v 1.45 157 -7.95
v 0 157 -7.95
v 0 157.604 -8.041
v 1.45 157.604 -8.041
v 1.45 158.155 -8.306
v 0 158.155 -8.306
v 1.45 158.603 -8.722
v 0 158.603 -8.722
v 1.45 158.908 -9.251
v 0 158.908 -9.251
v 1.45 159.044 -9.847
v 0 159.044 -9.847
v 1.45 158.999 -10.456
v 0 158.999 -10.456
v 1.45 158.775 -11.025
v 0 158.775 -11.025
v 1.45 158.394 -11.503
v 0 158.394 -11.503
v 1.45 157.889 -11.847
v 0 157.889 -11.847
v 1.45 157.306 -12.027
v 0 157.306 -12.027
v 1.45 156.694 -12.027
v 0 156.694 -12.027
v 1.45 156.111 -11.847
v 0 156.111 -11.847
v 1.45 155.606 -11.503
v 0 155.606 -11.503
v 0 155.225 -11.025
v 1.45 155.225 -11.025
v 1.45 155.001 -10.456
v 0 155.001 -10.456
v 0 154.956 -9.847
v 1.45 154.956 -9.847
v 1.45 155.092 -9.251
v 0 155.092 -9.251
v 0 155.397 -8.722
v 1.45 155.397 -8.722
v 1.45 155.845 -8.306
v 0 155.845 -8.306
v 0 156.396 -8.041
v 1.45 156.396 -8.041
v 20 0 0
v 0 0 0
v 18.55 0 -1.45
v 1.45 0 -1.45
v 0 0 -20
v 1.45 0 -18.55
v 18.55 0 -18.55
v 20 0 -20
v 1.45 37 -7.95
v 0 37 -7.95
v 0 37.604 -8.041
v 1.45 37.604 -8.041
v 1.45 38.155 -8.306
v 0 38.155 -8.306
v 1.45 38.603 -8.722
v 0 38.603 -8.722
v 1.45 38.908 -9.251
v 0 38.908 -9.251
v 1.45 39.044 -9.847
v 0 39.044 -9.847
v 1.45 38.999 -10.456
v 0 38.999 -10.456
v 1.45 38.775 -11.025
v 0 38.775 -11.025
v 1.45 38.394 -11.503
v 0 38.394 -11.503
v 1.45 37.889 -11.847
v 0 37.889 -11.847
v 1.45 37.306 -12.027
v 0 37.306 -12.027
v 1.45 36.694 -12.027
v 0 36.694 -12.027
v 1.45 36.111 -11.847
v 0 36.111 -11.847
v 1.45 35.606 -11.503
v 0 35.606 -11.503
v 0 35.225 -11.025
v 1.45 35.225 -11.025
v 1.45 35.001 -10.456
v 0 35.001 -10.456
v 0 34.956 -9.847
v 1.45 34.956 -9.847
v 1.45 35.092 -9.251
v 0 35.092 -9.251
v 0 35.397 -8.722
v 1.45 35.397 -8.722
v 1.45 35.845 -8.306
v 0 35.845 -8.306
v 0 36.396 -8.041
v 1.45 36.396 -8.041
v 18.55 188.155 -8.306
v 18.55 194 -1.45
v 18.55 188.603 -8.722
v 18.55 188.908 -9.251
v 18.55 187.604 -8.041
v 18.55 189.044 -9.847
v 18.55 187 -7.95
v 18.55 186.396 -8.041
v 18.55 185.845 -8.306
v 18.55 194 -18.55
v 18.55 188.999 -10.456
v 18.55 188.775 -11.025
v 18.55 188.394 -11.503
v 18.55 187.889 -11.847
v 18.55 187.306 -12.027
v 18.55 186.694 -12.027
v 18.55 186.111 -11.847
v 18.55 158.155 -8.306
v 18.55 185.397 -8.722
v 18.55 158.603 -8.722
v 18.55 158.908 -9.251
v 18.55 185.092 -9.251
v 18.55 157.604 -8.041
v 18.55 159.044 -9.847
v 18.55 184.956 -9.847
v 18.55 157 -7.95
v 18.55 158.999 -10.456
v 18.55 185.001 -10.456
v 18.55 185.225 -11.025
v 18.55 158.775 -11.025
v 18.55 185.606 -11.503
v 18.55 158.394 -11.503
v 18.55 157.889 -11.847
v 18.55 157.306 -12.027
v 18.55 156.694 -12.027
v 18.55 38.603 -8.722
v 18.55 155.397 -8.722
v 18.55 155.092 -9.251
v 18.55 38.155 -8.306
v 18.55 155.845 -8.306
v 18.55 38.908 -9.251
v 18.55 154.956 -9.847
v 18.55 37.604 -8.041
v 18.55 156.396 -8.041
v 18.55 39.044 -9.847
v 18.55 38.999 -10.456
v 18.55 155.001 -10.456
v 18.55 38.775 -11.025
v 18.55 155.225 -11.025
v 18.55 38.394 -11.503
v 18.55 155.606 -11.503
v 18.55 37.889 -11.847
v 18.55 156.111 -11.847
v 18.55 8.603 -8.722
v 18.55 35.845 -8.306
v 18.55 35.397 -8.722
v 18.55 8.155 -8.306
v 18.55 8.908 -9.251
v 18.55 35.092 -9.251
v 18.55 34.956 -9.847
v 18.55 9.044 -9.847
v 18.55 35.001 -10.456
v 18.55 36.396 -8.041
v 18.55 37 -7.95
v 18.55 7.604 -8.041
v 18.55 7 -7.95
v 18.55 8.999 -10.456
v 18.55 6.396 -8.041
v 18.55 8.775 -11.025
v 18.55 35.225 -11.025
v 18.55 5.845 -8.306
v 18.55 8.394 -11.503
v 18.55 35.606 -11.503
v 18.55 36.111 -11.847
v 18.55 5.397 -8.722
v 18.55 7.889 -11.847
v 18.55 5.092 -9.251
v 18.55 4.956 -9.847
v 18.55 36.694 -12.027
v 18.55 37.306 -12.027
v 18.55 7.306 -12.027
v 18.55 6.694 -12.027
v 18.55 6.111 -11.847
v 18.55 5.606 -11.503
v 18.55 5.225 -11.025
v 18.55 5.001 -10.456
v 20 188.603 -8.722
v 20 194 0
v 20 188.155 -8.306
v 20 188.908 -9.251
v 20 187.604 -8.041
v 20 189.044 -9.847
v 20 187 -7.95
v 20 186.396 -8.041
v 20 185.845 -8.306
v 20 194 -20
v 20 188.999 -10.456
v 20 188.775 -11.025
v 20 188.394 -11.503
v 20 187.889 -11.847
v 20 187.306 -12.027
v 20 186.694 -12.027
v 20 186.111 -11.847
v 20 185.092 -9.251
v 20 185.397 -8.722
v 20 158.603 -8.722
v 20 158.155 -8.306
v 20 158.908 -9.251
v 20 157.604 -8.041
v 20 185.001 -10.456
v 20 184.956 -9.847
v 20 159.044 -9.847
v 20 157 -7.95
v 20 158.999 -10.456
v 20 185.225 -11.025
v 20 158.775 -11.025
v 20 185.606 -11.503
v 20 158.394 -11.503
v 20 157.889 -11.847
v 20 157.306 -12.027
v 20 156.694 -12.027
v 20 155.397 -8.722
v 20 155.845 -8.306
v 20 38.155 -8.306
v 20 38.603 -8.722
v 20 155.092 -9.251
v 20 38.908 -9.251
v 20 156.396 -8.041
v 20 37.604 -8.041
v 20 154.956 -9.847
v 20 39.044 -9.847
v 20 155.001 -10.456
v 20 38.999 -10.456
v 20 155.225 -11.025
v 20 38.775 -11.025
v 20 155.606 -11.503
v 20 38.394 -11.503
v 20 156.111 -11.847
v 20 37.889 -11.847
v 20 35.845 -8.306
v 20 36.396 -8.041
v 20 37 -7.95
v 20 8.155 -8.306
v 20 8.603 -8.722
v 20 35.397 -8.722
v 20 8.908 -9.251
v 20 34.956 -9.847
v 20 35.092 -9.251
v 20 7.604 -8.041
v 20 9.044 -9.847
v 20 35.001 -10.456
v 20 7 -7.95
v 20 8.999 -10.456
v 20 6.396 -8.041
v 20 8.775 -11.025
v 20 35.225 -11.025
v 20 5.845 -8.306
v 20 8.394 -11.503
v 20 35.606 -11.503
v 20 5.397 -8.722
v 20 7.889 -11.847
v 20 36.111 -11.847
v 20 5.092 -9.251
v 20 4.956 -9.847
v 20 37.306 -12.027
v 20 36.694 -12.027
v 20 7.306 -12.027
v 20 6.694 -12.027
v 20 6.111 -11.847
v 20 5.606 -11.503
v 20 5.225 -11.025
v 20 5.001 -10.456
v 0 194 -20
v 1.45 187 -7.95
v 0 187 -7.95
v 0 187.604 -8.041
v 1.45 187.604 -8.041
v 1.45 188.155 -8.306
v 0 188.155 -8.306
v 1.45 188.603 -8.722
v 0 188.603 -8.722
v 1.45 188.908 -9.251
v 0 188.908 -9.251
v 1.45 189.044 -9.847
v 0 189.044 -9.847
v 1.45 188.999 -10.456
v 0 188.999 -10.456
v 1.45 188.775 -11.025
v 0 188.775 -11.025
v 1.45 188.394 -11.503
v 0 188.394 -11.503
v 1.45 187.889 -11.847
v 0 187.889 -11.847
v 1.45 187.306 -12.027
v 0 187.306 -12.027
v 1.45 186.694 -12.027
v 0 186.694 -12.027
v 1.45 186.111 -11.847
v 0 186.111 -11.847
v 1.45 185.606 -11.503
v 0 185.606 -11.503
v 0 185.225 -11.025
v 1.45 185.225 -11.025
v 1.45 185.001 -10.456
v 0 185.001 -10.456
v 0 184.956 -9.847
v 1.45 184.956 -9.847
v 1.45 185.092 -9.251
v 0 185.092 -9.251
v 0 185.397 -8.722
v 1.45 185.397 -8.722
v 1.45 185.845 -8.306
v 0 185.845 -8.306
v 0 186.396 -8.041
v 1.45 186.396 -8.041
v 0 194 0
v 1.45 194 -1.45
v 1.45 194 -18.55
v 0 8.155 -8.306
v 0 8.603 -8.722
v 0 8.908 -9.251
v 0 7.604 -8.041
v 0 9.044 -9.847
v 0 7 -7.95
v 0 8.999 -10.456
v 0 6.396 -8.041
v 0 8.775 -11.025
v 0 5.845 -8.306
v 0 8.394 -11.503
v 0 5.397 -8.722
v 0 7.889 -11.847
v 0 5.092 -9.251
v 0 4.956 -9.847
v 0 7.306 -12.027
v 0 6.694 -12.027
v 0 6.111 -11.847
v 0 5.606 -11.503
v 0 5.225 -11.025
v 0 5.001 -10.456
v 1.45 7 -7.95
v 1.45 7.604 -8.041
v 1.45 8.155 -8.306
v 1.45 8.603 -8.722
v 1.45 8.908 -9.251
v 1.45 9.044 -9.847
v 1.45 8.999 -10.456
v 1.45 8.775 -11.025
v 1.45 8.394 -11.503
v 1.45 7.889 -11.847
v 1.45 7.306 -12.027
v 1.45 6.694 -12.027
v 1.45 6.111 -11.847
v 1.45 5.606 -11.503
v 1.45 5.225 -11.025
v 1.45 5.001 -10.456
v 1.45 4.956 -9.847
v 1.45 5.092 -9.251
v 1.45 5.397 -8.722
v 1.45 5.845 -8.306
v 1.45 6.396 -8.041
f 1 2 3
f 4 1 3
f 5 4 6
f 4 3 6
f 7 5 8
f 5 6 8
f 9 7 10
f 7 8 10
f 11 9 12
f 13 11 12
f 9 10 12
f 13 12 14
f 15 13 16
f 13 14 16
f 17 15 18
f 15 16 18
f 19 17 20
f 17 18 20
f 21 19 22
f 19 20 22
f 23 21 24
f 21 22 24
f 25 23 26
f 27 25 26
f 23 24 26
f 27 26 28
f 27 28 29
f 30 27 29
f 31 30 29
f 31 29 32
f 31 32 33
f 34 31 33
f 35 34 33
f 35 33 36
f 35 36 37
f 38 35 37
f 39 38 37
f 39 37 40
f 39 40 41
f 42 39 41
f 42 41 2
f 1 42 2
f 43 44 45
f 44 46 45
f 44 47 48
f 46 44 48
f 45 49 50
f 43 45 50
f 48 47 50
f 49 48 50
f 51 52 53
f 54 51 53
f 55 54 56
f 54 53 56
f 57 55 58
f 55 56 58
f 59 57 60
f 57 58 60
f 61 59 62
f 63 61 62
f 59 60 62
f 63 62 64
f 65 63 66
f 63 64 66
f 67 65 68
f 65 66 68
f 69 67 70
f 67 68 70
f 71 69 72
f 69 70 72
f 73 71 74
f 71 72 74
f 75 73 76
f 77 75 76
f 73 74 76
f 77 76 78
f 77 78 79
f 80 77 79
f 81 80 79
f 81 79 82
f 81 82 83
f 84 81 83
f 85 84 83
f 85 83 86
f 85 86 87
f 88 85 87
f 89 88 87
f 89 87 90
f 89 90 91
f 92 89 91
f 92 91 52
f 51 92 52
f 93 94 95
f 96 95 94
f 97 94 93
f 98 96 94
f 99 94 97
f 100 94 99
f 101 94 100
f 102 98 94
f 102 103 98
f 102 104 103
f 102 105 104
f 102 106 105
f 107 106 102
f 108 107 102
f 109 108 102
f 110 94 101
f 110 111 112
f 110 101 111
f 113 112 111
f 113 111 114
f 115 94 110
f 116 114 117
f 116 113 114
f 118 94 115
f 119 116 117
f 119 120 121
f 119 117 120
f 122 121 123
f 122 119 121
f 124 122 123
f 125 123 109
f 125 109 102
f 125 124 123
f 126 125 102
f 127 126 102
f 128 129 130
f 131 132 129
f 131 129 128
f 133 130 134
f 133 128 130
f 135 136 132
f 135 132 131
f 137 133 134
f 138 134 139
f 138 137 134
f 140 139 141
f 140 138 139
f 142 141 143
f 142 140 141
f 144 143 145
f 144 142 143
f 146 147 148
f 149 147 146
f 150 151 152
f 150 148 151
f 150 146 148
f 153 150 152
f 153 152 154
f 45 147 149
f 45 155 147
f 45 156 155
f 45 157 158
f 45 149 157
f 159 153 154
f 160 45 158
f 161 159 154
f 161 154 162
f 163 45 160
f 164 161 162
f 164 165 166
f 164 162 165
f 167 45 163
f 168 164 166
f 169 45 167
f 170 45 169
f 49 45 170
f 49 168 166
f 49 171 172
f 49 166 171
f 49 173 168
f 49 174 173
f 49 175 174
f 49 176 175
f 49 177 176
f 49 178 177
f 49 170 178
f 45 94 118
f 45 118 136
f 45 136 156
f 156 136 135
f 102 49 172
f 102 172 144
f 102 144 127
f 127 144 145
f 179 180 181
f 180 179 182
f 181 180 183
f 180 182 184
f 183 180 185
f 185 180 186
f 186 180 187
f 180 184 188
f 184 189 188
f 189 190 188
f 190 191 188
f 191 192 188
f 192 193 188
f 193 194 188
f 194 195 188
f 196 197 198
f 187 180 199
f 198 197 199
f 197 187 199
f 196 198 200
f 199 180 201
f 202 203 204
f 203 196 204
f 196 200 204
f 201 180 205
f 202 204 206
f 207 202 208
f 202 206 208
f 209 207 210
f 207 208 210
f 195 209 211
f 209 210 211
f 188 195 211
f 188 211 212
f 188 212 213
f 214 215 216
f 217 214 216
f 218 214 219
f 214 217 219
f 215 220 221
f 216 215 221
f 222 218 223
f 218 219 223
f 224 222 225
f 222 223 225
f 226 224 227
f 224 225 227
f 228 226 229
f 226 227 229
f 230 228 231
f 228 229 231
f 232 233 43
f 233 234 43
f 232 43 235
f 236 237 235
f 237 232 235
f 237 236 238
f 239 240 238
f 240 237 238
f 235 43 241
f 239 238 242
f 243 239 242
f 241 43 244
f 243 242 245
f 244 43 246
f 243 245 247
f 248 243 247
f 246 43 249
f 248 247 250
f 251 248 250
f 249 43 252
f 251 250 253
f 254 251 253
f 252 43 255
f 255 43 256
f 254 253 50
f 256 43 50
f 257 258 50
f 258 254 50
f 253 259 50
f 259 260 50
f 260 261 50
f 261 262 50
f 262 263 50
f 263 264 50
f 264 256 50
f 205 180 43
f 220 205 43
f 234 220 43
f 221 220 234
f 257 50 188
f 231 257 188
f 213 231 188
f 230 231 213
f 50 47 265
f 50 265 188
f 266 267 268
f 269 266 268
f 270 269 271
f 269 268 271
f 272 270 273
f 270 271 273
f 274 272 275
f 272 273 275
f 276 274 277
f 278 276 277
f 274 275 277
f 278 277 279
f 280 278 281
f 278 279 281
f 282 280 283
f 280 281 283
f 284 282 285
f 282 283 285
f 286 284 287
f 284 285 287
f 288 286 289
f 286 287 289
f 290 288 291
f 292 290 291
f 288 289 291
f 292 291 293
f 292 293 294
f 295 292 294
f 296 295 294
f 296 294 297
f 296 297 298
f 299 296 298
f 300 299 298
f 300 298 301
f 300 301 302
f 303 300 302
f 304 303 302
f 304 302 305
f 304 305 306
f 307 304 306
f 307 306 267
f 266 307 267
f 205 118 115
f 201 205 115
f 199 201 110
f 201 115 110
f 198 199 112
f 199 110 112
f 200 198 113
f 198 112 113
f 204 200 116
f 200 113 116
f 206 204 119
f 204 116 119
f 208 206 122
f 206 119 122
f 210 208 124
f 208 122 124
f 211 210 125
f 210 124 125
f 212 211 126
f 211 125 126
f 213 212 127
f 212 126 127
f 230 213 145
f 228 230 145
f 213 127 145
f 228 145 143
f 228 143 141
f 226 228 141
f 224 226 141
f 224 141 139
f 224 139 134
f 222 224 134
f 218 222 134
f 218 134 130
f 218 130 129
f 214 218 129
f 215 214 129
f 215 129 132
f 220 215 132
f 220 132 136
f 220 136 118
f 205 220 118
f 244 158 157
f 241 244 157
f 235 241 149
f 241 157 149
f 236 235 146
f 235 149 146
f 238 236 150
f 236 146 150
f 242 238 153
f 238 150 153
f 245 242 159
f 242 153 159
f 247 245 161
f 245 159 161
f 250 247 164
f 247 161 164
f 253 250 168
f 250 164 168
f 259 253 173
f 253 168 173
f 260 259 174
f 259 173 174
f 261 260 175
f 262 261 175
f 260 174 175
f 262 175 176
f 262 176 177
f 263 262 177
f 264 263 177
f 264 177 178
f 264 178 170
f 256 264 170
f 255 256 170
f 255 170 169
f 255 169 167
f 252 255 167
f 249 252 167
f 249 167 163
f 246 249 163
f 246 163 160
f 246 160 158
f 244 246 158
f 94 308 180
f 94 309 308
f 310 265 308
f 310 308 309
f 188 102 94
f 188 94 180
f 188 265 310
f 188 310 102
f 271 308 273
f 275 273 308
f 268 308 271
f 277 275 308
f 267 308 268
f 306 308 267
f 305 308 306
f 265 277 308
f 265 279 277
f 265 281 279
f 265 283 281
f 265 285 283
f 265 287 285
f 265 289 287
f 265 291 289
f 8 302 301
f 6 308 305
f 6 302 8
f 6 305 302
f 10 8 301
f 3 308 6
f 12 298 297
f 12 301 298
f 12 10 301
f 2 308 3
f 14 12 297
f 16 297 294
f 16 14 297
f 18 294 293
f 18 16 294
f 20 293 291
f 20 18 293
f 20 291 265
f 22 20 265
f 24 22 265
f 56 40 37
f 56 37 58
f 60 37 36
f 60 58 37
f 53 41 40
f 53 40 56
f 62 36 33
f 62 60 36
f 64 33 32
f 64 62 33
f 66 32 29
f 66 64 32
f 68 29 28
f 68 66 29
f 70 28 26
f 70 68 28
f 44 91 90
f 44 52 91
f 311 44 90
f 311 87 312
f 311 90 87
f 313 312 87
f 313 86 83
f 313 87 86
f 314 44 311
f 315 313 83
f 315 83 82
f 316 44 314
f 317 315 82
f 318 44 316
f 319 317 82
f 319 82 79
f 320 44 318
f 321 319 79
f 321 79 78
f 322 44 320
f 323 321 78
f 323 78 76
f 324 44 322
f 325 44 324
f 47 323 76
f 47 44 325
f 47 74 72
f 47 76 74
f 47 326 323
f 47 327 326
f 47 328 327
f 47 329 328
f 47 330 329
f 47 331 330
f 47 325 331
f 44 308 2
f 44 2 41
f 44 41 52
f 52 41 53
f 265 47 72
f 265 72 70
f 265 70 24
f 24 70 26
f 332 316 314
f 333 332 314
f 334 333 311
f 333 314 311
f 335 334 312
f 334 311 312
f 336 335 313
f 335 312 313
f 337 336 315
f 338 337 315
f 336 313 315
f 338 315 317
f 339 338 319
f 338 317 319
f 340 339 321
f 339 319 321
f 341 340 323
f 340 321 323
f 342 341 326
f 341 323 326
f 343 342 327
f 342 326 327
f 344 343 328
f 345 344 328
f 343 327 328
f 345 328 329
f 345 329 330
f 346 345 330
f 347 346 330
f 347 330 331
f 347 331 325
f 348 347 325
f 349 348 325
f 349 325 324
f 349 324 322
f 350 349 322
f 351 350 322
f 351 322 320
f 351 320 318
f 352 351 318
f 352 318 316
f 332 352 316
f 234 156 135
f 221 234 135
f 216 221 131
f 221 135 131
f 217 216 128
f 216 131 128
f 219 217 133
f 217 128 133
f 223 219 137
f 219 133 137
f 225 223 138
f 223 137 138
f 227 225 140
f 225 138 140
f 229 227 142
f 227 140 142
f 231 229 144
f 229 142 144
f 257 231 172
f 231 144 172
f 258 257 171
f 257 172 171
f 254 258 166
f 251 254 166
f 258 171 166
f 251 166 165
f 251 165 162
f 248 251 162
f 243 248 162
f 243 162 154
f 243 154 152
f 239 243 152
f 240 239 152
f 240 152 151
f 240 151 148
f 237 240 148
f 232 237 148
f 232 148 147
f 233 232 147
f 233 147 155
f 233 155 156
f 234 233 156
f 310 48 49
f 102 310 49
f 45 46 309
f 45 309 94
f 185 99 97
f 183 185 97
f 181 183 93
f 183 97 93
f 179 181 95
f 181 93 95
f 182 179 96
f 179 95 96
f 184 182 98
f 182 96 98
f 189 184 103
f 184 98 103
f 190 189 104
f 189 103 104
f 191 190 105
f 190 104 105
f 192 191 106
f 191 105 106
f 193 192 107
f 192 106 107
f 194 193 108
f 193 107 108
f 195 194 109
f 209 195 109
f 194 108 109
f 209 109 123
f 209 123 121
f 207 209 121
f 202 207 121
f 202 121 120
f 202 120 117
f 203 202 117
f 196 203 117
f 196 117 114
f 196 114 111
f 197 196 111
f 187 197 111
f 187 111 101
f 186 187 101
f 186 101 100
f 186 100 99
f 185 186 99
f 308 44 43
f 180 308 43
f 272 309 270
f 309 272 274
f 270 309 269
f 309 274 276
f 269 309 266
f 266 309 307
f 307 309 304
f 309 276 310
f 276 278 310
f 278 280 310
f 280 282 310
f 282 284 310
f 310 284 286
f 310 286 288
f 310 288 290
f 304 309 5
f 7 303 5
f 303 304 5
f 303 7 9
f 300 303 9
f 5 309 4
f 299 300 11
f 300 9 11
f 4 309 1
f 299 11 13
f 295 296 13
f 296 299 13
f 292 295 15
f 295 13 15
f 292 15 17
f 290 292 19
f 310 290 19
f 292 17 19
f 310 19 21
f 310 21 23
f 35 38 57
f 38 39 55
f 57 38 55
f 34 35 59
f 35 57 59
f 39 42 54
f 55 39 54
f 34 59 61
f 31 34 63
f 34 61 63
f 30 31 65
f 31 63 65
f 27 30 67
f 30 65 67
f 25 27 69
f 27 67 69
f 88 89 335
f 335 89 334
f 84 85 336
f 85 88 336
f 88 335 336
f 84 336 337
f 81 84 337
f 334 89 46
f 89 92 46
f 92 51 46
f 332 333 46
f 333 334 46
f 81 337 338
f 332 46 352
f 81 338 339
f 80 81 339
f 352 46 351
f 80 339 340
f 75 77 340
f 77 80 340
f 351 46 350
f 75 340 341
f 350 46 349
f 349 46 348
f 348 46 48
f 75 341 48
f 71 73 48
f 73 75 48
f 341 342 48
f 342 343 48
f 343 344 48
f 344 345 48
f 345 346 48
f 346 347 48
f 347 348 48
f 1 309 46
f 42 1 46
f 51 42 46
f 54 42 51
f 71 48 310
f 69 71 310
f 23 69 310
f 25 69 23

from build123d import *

# Parameters (mm, degrees)
SKETCH1_W           = 20
SKETCH1_H           = 20
SKETCH1_W_2         = 17.1
SKETCH1_H_2         = 17.1
BOSS_EXTRUDE1_DEPTH = 194
SKETCH2_R           = 2.05
CUT_EXTRUDE1_DEPTH  = 21


with BuildPart() as part:
    # Sketch1 → Boss-Extrude1 (new body)
    with BuildSketch(Plane(origin=(0, 0, 0), x_dir=(1, 0, 0), z_dir=(0, 1, 0))):
        with Locations((10, 10)):
            Rectangle(SKETCH1_W, SKETCH1_H)
        with Locations((10, 10)):
            Rectangle(SKETCH1_W_2, SKETCH1_H_2, mode=Mode.SUBTRACT)
    extrude(amount=BOSS_EXTRUDE1_DEPTH)

    # Sketch2 → Cut-Extrude1 (cut, through all)
    with BuildSketch(Plane.ZY):
        with Locations((-10, 187)):
            Circle(SKETCH2_R)
        with Locations((-10, 157)):
            Circle(SKETCH2_R)
        with Locations((-10, 37)):
            Circle(SKETCH2_R)
        with Locations((-10, 7)):
            Circle(SKETCH2_R)
    extrude(amount=-CUT_EXTRUDE1_DEPTH, mode=Mode.SUBTRACT)


solid = part.part
